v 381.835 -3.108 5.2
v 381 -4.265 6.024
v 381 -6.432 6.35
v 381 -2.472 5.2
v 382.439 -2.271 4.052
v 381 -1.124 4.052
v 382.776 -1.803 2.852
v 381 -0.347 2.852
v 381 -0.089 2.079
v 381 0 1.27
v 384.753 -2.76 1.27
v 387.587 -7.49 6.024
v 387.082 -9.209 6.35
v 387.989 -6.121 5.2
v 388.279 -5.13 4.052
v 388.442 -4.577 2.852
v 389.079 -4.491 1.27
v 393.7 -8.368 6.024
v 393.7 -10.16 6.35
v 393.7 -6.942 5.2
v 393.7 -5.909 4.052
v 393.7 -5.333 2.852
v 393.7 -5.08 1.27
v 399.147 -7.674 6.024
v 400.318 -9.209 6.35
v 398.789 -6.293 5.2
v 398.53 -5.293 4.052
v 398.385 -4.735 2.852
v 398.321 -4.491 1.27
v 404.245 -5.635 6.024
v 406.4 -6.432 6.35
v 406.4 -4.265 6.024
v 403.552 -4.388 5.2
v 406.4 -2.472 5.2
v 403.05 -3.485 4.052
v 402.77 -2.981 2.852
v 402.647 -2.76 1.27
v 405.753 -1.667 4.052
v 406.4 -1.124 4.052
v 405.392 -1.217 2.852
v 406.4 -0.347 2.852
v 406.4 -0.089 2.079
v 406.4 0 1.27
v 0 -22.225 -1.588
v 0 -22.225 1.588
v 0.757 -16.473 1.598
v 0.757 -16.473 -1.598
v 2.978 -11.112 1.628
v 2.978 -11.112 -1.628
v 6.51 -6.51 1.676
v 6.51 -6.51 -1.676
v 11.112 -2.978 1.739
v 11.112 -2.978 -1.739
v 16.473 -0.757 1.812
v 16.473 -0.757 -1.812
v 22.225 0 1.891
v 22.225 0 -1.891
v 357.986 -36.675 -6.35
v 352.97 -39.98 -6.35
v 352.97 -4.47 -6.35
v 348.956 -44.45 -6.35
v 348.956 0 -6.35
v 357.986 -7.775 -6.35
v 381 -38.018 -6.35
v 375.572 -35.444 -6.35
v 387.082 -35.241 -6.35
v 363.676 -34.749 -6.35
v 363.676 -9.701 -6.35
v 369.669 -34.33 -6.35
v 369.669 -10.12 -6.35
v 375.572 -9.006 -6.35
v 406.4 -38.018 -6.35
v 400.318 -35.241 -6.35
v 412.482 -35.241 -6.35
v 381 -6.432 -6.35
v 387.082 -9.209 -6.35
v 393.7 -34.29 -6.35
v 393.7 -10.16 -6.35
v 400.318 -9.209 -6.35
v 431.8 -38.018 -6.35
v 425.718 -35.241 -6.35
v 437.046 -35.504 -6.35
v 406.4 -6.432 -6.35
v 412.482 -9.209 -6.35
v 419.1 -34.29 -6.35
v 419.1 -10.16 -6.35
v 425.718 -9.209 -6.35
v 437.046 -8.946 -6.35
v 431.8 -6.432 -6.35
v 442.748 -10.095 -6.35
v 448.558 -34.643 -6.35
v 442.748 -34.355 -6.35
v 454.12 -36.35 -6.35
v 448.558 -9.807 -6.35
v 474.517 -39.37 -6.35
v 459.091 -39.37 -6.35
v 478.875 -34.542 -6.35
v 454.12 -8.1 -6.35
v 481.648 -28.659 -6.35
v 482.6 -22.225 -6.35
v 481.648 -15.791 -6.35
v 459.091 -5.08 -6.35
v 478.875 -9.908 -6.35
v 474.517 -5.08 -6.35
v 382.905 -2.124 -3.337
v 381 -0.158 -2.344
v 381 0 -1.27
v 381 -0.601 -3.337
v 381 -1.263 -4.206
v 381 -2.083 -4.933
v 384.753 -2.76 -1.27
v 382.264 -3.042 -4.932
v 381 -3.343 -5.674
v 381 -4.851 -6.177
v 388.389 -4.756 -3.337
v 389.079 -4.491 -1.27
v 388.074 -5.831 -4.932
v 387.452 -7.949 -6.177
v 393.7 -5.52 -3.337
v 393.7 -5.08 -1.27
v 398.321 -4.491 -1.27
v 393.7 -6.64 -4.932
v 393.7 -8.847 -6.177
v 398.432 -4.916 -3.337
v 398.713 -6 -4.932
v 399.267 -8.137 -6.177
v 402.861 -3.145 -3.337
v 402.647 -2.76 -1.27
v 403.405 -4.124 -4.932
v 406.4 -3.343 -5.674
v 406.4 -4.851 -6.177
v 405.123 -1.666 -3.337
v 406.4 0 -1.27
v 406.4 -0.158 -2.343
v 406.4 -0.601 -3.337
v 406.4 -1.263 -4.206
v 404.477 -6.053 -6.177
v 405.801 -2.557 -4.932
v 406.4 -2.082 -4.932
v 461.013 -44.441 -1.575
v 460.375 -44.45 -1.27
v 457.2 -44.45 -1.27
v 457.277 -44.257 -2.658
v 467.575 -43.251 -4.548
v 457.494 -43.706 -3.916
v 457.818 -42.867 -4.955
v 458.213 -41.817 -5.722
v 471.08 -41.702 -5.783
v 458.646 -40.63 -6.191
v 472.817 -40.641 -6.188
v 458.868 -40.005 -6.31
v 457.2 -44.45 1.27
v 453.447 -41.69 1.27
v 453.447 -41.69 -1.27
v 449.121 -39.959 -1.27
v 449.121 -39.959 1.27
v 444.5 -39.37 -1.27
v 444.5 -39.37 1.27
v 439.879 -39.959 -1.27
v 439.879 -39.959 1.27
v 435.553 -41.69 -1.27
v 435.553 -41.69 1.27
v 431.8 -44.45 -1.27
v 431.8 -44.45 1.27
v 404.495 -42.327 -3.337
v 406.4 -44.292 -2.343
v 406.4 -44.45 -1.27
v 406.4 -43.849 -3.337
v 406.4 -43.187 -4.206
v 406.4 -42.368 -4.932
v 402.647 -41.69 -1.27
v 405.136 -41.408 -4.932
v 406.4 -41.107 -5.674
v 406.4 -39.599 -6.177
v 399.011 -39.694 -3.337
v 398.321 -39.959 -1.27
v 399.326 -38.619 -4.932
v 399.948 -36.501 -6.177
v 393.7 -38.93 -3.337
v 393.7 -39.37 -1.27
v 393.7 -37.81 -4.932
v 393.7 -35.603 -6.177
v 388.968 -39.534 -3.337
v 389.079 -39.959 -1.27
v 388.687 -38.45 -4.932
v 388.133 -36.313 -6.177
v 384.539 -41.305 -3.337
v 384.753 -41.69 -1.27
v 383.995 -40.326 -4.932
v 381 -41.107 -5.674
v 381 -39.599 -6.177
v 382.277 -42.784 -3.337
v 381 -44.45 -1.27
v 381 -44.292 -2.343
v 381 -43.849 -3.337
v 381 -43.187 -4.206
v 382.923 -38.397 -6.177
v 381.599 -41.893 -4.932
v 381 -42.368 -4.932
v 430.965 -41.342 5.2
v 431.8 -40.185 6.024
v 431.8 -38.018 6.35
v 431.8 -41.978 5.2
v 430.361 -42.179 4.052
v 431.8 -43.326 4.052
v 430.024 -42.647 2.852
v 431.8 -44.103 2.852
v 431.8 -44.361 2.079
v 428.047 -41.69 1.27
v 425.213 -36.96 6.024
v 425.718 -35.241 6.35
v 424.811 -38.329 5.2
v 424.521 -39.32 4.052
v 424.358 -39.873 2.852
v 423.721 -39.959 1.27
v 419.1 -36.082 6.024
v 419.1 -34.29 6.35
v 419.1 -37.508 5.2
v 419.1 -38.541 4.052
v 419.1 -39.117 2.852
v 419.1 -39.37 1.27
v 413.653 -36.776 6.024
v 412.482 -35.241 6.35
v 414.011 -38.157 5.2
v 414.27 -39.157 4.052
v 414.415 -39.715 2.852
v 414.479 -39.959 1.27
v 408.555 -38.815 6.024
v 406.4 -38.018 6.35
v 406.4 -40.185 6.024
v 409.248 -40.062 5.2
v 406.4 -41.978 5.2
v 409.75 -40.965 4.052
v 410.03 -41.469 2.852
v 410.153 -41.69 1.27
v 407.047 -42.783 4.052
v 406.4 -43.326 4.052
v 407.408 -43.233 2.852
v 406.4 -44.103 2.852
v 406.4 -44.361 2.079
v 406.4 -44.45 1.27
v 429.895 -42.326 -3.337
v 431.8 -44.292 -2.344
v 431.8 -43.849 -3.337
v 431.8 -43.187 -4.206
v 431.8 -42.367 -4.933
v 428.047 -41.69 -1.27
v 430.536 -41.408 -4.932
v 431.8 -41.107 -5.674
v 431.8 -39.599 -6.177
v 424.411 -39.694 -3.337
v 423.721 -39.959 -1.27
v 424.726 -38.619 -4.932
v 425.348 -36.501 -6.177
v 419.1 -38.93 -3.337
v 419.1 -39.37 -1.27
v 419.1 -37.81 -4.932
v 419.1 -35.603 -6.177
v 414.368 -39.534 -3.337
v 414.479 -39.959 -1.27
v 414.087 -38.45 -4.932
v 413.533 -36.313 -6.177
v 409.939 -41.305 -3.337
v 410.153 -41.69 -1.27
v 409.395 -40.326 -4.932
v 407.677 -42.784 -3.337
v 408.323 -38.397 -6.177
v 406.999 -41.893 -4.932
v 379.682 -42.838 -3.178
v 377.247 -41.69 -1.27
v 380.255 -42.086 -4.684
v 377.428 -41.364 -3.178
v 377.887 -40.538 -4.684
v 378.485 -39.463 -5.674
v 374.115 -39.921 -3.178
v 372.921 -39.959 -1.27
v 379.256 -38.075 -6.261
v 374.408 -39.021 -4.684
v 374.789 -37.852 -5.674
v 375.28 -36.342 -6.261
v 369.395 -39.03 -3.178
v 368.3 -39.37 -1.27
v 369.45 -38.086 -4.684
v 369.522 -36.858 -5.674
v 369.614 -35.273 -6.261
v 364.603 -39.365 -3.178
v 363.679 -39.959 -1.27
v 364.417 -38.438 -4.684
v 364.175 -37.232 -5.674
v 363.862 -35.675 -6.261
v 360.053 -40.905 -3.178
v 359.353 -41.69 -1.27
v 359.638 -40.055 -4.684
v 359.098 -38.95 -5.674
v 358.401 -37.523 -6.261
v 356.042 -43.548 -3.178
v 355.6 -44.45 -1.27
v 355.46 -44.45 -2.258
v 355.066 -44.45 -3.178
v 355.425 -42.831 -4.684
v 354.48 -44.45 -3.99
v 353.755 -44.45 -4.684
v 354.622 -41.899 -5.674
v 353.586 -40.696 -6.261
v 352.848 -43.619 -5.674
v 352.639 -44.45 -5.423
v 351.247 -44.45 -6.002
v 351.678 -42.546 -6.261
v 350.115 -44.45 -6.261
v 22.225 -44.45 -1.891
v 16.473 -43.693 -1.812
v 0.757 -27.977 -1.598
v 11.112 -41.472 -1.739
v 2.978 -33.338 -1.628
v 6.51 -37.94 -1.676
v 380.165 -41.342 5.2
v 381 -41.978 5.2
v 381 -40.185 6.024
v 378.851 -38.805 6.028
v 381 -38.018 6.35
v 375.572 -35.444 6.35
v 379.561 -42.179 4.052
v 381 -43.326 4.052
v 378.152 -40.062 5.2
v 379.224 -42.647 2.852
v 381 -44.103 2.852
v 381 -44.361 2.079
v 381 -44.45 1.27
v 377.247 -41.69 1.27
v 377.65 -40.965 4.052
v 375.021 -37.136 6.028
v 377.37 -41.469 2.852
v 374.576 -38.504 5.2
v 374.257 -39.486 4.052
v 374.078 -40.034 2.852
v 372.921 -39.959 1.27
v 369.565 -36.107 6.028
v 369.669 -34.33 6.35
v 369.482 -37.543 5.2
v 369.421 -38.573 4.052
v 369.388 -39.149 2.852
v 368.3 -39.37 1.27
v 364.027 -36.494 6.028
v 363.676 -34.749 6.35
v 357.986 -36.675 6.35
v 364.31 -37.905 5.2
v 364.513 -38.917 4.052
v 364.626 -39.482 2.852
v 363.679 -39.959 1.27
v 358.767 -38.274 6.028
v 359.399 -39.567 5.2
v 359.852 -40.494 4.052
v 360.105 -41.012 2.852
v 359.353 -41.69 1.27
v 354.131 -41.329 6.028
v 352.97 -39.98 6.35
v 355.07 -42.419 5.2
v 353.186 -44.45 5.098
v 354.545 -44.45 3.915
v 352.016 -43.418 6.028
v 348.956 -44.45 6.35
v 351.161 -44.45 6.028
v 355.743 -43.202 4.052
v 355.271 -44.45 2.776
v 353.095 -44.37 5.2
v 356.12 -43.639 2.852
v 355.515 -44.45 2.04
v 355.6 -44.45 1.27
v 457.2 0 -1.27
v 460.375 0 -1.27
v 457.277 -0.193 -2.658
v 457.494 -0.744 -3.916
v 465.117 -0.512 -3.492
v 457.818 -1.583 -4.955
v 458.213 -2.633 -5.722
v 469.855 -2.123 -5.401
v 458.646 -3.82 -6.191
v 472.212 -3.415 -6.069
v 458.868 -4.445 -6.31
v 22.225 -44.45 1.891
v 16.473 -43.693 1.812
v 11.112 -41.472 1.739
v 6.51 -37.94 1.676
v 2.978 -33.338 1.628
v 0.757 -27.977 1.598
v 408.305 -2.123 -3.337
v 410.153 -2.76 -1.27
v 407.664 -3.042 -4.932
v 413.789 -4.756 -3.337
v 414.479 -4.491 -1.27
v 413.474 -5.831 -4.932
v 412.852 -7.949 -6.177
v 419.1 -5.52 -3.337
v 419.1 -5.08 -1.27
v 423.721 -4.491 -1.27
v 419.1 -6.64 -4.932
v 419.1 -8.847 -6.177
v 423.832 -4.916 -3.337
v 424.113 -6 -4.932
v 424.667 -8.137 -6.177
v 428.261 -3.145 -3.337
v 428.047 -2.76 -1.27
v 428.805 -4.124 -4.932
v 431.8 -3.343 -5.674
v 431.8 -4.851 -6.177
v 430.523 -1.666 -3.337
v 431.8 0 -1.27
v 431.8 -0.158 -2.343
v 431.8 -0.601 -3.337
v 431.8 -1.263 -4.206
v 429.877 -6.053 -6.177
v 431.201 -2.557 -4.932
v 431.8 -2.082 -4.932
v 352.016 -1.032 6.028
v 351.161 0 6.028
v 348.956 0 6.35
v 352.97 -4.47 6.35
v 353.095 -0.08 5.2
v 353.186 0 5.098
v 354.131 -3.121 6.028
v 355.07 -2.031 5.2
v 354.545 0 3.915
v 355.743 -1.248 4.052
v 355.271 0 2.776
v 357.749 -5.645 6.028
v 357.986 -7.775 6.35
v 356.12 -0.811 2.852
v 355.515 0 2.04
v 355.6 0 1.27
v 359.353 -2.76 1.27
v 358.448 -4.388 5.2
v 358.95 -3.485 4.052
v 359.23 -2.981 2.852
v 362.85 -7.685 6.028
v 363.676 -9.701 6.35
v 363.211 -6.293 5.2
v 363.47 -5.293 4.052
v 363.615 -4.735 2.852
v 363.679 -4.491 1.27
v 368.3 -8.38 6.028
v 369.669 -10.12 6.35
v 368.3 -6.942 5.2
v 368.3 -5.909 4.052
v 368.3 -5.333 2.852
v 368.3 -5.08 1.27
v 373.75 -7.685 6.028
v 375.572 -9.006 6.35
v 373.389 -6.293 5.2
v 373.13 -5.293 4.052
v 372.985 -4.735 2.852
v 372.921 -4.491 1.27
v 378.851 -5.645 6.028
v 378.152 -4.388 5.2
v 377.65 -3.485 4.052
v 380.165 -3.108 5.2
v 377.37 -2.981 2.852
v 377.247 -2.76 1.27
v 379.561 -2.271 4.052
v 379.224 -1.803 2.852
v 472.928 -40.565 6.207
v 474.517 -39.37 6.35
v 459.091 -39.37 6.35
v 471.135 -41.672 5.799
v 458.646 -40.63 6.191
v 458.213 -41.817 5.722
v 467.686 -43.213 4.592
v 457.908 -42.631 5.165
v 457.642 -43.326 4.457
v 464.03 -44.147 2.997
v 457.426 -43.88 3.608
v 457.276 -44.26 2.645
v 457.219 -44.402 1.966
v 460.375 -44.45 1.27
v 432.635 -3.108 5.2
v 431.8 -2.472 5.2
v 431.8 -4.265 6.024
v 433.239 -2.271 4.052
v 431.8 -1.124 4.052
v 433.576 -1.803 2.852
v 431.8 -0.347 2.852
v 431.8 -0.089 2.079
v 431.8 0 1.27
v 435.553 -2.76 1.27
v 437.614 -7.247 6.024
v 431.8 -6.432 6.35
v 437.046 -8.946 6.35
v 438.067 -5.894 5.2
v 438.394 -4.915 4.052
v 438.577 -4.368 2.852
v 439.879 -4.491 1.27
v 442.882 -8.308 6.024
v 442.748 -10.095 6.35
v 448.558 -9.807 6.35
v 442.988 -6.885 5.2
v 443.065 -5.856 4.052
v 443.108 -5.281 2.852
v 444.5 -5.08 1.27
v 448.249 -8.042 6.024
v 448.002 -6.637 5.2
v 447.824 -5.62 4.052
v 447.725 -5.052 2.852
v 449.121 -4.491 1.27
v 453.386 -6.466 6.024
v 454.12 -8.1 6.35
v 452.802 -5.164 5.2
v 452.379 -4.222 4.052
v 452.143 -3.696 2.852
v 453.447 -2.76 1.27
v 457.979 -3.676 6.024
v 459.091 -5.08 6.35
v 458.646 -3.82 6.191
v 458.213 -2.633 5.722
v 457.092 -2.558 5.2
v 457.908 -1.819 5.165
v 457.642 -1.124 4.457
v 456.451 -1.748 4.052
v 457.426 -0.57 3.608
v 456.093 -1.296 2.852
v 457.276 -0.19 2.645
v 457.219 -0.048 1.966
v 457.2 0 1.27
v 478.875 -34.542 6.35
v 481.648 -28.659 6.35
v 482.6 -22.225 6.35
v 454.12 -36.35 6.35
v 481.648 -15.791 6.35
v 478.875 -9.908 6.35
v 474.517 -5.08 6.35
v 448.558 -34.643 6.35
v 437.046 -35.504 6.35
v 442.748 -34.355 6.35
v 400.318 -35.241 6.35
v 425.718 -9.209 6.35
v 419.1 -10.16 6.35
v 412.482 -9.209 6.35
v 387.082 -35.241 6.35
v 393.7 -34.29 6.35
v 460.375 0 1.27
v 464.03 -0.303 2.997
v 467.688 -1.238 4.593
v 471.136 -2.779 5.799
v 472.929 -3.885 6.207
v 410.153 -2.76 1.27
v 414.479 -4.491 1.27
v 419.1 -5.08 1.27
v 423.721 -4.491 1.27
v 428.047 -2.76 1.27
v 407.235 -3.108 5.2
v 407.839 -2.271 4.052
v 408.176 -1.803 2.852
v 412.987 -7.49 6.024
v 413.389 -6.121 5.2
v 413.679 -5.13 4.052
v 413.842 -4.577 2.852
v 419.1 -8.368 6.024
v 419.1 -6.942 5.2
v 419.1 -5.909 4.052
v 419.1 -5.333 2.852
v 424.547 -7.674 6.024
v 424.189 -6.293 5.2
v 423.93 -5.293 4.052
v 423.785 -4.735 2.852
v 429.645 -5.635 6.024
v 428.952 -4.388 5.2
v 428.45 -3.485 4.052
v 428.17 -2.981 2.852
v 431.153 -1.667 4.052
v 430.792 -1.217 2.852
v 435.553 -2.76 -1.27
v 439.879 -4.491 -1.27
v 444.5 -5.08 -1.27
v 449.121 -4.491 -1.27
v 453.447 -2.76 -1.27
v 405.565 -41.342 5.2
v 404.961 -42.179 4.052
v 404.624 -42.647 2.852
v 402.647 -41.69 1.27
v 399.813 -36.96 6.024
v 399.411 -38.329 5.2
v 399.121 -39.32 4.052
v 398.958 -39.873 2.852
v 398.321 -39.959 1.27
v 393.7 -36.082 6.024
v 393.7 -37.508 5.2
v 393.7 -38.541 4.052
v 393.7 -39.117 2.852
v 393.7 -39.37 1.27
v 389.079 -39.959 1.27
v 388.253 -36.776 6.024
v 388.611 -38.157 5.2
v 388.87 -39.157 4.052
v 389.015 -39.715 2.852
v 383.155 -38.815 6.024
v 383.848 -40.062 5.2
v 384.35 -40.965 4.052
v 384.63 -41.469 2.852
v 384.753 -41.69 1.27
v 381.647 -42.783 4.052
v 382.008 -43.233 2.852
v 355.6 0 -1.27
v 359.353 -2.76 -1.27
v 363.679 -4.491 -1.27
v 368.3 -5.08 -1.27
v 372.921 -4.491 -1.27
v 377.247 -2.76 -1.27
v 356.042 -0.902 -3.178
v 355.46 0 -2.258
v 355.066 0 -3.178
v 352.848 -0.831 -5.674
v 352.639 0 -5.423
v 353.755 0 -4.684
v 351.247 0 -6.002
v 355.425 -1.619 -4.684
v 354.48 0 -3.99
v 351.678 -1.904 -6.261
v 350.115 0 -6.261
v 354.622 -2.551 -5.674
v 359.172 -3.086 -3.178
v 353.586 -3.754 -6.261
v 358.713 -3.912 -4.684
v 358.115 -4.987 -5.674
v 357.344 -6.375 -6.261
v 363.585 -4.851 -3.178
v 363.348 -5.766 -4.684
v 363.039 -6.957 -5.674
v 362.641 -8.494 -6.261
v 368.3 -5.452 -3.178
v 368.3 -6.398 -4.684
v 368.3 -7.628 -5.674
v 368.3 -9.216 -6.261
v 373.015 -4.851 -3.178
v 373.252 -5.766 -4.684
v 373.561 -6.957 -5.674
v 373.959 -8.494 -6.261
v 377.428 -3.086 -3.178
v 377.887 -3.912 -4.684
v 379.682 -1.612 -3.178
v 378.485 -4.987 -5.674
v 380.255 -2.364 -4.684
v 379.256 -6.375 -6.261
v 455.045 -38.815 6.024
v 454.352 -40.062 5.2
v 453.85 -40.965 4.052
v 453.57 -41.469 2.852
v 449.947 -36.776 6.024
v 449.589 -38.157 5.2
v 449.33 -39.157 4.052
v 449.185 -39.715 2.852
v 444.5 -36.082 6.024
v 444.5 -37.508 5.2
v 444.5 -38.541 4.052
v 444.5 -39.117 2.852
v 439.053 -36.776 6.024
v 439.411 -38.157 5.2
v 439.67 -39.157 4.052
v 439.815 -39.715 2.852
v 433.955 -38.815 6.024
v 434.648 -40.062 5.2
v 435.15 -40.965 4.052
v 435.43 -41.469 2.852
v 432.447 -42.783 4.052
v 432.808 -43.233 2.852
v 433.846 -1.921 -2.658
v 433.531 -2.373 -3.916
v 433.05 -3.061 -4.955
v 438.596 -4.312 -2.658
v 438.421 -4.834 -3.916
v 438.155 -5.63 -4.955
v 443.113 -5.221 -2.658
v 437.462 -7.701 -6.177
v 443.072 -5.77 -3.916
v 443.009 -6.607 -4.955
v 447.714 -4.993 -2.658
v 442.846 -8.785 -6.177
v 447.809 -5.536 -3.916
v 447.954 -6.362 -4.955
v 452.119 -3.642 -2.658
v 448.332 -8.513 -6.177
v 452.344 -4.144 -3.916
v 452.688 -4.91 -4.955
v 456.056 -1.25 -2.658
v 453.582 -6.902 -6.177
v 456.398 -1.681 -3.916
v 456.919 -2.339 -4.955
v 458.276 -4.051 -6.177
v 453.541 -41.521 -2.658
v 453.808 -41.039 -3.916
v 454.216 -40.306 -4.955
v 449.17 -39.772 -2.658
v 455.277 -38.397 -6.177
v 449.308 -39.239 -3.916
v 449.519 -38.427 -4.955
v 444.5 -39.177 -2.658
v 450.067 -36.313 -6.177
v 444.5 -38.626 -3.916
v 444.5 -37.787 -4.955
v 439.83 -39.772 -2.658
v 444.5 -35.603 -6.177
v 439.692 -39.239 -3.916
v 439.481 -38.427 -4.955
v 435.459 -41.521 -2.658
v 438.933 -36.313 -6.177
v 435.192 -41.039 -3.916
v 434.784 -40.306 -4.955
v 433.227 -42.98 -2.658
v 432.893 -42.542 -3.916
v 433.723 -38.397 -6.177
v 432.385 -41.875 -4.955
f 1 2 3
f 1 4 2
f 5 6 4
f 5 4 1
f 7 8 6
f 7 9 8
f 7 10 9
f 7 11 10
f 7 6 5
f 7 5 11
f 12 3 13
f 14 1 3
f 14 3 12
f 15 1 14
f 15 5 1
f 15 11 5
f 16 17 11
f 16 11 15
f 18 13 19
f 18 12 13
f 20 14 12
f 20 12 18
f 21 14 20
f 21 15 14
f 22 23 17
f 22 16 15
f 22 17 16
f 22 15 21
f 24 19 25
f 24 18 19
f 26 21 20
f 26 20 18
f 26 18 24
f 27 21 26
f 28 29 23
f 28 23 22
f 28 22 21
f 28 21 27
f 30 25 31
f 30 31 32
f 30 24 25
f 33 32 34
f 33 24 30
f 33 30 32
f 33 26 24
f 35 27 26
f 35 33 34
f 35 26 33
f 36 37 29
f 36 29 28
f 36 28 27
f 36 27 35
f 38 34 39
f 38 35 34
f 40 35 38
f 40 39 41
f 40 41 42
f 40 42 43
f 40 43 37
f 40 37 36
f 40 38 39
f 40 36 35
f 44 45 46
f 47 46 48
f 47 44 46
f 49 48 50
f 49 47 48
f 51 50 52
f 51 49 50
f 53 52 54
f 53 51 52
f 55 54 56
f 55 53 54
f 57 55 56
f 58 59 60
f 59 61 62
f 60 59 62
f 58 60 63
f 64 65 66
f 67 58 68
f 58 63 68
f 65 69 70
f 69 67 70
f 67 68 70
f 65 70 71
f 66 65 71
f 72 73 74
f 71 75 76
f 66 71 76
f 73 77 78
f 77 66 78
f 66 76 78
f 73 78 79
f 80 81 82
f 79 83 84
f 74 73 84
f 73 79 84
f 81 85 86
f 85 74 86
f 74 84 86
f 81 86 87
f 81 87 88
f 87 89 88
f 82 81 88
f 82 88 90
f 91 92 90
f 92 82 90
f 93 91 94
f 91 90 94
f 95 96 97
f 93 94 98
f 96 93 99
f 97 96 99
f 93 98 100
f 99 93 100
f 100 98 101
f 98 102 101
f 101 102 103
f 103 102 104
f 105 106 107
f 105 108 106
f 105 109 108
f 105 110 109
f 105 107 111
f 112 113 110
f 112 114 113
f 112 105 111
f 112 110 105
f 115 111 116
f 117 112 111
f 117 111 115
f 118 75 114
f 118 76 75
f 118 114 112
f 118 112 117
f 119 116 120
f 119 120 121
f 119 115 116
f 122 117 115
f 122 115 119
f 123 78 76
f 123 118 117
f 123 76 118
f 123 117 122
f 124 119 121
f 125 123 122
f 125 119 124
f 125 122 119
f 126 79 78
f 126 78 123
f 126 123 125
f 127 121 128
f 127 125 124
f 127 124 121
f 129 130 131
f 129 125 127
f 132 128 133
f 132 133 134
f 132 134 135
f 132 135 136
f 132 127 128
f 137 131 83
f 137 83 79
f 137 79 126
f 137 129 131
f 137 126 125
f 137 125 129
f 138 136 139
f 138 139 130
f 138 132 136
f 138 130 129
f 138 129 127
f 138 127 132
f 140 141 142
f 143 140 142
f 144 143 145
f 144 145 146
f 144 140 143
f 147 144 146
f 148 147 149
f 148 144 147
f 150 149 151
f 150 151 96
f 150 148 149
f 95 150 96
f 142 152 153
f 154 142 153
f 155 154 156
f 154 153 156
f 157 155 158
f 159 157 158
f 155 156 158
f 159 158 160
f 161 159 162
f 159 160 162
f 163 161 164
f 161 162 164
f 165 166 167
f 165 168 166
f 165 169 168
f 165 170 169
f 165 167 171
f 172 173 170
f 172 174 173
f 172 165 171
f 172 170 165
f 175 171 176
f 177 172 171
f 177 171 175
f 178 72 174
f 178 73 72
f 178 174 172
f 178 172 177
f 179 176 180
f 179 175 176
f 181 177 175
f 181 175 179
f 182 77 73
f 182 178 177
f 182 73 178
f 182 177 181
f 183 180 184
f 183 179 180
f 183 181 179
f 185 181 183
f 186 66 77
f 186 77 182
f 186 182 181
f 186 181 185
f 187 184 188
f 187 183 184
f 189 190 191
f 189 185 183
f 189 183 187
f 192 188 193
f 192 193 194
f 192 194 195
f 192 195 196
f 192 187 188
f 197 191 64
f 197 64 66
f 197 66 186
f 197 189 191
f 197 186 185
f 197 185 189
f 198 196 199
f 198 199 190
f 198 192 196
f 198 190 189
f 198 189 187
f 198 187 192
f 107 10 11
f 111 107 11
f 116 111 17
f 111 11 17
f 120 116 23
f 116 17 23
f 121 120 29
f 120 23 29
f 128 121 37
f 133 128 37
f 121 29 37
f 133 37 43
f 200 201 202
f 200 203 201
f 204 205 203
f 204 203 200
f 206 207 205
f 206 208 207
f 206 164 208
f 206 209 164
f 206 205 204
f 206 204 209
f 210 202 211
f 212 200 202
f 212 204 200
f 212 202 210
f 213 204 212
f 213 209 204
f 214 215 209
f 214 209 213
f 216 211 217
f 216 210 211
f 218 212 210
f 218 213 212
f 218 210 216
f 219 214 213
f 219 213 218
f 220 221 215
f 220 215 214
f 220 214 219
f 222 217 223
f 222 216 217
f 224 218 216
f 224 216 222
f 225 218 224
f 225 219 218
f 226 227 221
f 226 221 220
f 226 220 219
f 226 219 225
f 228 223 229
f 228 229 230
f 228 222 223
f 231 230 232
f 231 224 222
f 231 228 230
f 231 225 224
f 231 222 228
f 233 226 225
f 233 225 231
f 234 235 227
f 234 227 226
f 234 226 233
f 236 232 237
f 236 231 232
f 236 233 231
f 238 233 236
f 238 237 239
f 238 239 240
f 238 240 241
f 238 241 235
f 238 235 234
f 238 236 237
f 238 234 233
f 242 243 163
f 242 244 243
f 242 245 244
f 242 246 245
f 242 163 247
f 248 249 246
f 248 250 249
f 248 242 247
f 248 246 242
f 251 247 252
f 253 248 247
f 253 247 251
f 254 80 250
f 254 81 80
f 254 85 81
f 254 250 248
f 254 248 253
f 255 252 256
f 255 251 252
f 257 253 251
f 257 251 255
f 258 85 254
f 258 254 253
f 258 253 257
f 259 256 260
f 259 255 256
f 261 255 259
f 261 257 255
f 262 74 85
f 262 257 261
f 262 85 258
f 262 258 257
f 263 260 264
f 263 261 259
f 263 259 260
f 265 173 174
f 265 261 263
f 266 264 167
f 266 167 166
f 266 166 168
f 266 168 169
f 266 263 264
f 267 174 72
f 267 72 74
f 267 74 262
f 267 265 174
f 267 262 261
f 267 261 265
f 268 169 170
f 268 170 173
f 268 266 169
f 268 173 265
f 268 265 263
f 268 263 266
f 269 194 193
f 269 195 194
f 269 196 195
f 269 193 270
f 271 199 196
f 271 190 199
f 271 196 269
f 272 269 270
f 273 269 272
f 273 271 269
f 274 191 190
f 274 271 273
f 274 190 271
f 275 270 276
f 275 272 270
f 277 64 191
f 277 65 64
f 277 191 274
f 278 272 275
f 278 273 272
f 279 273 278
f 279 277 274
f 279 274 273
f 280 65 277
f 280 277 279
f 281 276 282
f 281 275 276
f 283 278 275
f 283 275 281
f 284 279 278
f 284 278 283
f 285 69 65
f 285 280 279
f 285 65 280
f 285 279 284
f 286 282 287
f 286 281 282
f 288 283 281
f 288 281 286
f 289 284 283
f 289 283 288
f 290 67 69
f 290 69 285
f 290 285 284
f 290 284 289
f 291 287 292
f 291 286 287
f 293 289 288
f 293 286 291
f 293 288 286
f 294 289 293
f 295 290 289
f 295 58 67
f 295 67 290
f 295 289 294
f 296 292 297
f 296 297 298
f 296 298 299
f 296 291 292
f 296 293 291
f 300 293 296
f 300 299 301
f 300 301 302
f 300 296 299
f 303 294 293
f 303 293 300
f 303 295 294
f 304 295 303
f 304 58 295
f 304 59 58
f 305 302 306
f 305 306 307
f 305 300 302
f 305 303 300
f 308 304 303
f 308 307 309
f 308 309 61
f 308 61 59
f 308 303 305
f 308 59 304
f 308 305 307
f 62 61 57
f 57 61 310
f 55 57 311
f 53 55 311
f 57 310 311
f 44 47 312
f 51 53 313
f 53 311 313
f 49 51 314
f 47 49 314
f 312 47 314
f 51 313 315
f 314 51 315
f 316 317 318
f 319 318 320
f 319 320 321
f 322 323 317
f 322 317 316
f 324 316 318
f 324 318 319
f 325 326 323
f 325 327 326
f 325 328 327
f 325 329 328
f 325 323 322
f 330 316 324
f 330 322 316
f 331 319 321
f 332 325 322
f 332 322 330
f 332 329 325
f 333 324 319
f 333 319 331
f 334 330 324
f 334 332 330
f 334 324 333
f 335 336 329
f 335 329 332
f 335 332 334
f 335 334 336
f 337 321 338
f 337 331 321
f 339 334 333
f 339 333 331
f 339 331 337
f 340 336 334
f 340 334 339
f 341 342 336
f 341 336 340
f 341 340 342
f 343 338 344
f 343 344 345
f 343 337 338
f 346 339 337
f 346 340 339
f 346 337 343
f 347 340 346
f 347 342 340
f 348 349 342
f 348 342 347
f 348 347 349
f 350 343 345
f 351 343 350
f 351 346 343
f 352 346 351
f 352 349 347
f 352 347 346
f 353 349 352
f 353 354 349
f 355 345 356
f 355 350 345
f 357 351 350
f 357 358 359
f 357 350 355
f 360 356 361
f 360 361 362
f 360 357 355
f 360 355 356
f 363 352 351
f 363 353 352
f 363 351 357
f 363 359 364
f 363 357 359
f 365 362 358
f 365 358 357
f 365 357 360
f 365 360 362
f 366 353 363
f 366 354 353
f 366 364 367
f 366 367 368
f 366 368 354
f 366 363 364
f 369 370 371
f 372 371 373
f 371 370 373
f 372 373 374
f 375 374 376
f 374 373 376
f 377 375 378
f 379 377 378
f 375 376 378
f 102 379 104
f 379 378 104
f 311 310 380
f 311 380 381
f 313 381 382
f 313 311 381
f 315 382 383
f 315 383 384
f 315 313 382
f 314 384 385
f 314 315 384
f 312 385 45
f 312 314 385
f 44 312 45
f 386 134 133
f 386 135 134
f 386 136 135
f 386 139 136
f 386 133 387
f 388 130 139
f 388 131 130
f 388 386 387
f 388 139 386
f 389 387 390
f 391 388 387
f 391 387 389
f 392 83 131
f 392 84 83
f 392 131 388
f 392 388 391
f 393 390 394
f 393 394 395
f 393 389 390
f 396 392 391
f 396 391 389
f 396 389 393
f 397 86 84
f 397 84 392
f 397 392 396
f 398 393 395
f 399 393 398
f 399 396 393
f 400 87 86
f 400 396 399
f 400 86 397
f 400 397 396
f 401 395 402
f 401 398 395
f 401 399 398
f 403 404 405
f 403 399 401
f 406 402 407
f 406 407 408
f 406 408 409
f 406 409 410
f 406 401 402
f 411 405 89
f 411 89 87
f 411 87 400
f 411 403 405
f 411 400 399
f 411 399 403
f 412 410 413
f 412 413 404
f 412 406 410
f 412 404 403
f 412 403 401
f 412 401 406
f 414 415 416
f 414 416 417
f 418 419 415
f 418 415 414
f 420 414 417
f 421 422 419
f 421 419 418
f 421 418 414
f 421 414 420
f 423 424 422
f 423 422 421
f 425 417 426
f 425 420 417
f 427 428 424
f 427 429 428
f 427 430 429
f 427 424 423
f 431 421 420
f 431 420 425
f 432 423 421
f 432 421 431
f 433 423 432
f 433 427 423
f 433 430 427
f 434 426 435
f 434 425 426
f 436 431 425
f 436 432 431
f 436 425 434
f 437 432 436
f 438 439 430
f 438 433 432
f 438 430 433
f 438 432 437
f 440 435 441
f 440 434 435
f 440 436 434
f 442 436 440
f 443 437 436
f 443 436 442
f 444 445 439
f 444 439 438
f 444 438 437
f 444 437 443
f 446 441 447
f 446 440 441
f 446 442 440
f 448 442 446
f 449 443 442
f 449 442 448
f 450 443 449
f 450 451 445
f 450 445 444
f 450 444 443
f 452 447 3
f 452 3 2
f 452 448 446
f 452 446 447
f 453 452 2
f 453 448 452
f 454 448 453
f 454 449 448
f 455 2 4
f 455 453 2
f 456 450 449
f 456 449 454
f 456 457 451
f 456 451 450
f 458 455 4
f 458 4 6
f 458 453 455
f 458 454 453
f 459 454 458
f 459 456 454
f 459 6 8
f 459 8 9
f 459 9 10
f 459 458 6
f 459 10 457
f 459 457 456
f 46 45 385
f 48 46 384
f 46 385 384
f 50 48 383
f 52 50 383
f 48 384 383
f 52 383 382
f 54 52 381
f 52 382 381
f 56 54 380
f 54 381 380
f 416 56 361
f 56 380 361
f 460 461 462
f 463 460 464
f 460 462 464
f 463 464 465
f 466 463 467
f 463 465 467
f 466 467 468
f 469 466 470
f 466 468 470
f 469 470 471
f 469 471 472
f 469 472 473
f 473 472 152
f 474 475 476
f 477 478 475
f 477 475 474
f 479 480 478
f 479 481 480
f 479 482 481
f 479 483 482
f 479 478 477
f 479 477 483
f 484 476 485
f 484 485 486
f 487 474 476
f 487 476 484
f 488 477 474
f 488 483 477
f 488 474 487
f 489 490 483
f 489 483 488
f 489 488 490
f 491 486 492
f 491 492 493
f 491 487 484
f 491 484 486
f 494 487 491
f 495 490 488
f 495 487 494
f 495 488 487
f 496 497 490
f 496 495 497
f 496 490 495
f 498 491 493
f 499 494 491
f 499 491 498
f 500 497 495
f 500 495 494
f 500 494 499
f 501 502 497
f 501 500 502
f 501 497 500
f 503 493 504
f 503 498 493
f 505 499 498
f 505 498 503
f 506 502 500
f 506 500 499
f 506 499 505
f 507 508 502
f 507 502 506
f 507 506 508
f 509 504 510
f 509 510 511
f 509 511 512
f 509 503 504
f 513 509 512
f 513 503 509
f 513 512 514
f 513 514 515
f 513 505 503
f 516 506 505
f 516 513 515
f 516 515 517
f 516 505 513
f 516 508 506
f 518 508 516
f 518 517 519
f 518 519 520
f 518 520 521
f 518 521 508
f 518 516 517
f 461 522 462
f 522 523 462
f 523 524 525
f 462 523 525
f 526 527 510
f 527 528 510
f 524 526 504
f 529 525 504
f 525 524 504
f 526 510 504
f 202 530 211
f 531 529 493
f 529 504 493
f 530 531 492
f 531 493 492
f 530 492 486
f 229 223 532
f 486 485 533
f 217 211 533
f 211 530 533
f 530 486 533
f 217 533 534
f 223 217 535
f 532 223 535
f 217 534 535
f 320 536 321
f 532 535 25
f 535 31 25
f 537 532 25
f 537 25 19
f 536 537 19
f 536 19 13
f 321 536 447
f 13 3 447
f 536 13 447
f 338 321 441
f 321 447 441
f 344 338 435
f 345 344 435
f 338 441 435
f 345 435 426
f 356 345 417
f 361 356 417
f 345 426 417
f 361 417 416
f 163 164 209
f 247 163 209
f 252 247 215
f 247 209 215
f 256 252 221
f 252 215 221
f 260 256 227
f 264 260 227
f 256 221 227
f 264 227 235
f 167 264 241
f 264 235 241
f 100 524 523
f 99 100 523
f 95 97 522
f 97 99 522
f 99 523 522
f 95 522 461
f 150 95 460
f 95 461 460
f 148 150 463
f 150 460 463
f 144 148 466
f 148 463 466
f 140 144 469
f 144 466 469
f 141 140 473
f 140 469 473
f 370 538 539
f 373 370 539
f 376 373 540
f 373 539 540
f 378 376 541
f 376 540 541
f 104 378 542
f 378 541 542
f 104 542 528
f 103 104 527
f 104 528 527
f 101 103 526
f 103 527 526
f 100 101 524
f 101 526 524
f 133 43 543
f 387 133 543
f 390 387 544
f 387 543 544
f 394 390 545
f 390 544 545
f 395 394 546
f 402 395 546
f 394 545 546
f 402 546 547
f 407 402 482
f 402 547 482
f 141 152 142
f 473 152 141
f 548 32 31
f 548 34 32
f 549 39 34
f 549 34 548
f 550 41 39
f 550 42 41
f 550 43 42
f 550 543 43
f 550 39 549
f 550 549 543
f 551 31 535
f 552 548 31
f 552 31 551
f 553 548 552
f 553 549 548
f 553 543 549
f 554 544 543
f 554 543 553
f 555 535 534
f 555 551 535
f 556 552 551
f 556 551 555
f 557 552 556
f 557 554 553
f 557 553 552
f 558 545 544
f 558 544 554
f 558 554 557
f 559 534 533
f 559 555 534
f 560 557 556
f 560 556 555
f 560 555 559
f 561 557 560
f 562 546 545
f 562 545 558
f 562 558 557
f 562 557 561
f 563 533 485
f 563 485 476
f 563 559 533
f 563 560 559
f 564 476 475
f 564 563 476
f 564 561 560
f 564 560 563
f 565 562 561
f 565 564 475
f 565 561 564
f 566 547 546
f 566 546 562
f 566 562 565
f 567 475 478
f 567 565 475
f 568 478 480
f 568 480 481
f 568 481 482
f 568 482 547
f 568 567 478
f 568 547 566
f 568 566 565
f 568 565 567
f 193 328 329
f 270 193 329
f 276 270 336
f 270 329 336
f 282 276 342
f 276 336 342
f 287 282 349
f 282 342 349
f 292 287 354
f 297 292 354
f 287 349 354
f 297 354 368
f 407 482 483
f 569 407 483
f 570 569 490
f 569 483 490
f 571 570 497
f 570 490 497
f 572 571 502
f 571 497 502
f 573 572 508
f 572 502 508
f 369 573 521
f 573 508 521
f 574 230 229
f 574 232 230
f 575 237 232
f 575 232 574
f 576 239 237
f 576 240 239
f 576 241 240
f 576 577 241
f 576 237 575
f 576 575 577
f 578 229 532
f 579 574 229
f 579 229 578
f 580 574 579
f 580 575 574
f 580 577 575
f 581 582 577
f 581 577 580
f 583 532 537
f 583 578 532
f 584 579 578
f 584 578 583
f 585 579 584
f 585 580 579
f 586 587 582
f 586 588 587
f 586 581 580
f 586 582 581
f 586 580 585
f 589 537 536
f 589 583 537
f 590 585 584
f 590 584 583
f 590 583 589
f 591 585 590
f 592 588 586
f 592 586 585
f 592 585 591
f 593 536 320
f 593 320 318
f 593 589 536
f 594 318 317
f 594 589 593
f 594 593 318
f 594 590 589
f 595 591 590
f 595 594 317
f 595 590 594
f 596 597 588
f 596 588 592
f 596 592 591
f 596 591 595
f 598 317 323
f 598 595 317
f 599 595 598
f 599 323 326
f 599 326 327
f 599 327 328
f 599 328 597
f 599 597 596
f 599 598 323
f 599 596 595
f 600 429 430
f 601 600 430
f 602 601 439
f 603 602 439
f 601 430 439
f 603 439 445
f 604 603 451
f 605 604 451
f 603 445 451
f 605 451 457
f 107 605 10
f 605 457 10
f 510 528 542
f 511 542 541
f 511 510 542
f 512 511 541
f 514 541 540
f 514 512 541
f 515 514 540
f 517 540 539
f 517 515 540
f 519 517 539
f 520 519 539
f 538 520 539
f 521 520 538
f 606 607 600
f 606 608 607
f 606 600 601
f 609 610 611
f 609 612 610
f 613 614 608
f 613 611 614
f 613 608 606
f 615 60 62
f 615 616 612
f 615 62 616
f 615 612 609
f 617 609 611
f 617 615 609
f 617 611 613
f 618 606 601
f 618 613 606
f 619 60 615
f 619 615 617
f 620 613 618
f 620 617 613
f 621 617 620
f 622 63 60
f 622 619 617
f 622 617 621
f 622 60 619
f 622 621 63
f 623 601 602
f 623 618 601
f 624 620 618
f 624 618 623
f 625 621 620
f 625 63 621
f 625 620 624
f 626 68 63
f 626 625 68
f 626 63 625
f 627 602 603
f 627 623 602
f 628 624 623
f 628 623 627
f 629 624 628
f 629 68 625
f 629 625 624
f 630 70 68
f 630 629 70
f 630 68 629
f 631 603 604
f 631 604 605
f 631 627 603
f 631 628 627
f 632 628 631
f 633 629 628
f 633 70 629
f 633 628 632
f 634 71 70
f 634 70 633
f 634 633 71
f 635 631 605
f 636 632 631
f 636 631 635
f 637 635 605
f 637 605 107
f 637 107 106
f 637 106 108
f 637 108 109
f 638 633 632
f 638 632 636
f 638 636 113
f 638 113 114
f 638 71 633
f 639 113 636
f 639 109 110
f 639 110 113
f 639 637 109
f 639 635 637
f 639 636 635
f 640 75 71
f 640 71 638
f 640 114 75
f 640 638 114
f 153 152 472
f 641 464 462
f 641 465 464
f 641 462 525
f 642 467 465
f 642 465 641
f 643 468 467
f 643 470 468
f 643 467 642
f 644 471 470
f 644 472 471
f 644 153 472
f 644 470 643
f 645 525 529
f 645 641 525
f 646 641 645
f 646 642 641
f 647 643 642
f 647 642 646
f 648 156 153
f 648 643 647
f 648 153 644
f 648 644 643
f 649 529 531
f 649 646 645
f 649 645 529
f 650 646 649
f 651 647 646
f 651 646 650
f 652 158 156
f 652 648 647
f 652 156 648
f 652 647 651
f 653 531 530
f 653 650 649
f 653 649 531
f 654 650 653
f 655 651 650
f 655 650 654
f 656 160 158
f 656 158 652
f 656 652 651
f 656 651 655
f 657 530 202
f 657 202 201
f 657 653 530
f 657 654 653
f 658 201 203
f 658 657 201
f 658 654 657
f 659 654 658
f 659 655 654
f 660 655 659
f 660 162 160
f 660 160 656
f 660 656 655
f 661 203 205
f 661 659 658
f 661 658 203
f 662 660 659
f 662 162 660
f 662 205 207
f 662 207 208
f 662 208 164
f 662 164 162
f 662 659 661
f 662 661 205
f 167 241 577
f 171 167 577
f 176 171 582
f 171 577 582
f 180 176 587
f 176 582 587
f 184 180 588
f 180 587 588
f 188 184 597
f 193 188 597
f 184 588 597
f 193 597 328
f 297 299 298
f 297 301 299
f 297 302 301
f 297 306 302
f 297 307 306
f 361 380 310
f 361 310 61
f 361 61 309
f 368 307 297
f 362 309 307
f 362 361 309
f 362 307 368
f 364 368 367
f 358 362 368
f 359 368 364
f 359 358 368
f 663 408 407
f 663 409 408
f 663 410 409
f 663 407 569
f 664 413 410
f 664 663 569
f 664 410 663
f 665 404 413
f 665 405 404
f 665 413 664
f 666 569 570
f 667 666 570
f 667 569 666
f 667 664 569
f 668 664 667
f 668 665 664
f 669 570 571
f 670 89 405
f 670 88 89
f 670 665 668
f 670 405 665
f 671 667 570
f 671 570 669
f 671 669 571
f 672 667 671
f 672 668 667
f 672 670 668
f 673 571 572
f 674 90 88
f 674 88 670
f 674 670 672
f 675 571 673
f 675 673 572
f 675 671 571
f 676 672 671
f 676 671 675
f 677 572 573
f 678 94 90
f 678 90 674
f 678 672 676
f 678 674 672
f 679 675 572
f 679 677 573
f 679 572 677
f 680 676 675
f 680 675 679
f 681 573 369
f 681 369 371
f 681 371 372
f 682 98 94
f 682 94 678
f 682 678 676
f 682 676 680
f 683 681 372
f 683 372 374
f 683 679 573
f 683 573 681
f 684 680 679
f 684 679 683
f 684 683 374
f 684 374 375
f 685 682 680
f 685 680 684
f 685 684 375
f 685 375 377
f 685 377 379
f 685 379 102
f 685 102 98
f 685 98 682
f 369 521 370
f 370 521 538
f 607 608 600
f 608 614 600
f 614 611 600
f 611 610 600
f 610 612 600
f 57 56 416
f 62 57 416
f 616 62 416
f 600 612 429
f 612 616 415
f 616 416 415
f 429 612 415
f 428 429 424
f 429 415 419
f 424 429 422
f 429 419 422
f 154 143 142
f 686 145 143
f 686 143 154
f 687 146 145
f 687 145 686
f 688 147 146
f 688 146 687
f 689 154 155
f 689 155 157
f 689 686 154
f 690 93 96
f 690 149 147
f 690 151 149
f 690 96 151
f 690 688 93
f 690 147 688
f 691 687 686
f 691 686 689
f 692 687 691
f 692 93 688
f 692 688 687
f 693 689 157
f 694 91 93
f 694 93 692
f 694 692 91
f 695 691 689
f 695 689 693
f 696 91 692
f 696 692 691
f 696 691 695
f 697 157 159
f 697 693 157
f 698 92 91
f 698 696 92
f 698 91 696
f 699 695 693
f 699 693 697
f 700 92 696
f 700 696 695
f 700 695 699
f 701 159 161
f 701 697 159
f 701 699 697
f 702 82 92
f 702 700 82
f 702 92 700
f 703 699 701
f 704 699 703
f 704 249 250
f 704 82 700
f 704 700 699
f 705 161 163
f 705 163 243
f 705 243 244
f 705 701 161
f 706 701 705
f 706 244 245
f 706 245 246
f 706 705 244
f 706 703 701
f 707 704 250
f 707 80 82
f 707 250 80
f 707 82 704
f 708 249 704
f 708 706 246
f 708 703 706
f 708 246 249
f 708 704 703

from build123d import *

# Parameters (mm, degrees)
F1_DEPTH = 44.45
F3_DEPTH = 12.701
F4_R     = 5.08
F6_DEPTH = 44.4510001
F8_DEPTH = 12.7


with BuildPart() as f1:
    # F0 (on Front) → F1 (new body)
    with BuildSketch(Plane.XZ):
        Polygon((482.6, 0), (482.6, 6.35), (0, 6.35), (0, 0), (0, -6.35), (482.6, -6.35), align=None)
    extrude(amount=F1_DEPTH)

    # F2 (on face) → F3 (cut, through all)
    with BuildSketch(Plane.XY.offset(6.35)):
        with BuildLine():
            Line((381, 0), (355.6, 0))
            ThreePointArc((355.6, 0), (368.3, -5.08), (381, 0))
        make_face()
        with BuildLine():
            Line((457.2, 0), (431.8, 0))
            ThreePointArc((431.8, 0), (444.5, -5.08), (457.2, 0))
        make_face()
        with BuildLine():
            Line((431.8, 0), (406.4, 0))
            ThreePointArc((406.4, 0), (419.1, -5.08), (431.8, 0))
        make_face()
        with BuildLine():
            Line((406.4, 0), (381, 0))
            ThreePointArc((381, 0), (393.7, -5.08), (406.4, 0))
        make_face()
        with BuildLine():
            ThreePointArc((457.2, -44.45), (444.5, -39.37), (431.8, -44.45))
            Line((431.8, -44.45), (457.2, -44.45))
        make_face()
        with BuildLine():
            ThreePointArc((431.8, -44.45), (419.1, -39.37), (406.4, -44.45))
            Line((406.4, -44.45), (431.8, -44.45))
        make_face()
        with BuildLine():
            ThreePointArc((406.4, -44.45), (393.7, -39.37), (381, -44.45))
            Line((381, -44.45), (406.4, -44.45))
        make_face()
        with BuildLine():
            ThreePointArc((381, -44.45), (368.3, -39.37), (355.6, -44.45))
            Line((355.6, -44.45), (381, -44.45))
        make_face()
    extrude(amount=-F3_DEPTH, mode=Mode.SUBTRACT)

    # F4
    f4_edges = [f1.edges().sort_by_distance(p)[0] for p in [
        (368.3, -39.37, 6.35),
        (393.7, -39.37, 6.35),
        (419.1, -39.37, 6.35),
        (444.5, -39.37, 6.35),
        (444.5, -5.08, 6.35),
        (419.1, -5.08, 6.35),
        (393.7, -5.08, 6.35),
        (368.3, -5.08, 6.35),
        (419.1, -39.37, -6.35),
        (393.7, -39.37, -6.35),
        (368.3, -39.37, -6.35),
        (444.5, -39.37, -6.35),
        (469.9, -44.45, 6.35),
        (469.9, -44.45, -6.35),
        (469.9, 0, 6.35),
        (469.9, 0, -6.35),
        (444.5, -5.08, -6.35),
        (419.1, -5.08, -6.35),
        (393.7, -5.08, -6.35),
        (368.3, -5.08, -6.35),
    ]]
    fillet(f4_edges, radius=F4_R)

    # F5 (on face) → F6 (cut, through all)
    with BuildSketch(Plane.XZ.offset(44.45)):
        Polygon((0, 6.35), (0, 1.5875), (348.9559363111, 6.35), align=None)
        Polygon((348.9559363111, -6.35), (0, -1.5875), (0, -6.35), align=None)
    extrude(amount=-F6_DEPTH, mode=Mode.SUBTRACT)

    # F7 (on Top) → F8 (cut, symmetric)
    with BuildSketch(Plane.XY):
        with BuildLine():
            ThreePointArc((22.225, -44.45), (6.5095517881, -37.9404482119), (0, -22.225))
            Line((0, -22.225), (0, -44.45))
            Line((0, -44.45), (22.225, -44.45))
        make_face()
        with BuildLine():
            ThreePointArc((0, -22.225), (6.5095517881, -6.5095517881), (22.225, 0))
            Line((22.225, 0), (0, 0))
            Line((0, 0), (0, -22.225))
        make_face()
        with BuildLine():
            ThreePointArc((460.375, 0), (476.0904482119, -6.5095517881), (482.6, -22.225))
            Line((482.6, -22.225), (482.6, 0))
            Line((482.6, 0), (460.375, 0))
        make_face()
        with BuildLine():
            ThreePointArc((482.6, -22.225), (476.0904482119, -37.9404482119), (460.375, -44.45))
            Line((460.375, -44.45), (482.6, -44.45))
            Line((482.6, -44.45), (482.6, -22.225))
        make_face()
    extrude(amount=F8_DEPTH, both=True, mode=Mode.SUBTRACT)


solid = f1.part
